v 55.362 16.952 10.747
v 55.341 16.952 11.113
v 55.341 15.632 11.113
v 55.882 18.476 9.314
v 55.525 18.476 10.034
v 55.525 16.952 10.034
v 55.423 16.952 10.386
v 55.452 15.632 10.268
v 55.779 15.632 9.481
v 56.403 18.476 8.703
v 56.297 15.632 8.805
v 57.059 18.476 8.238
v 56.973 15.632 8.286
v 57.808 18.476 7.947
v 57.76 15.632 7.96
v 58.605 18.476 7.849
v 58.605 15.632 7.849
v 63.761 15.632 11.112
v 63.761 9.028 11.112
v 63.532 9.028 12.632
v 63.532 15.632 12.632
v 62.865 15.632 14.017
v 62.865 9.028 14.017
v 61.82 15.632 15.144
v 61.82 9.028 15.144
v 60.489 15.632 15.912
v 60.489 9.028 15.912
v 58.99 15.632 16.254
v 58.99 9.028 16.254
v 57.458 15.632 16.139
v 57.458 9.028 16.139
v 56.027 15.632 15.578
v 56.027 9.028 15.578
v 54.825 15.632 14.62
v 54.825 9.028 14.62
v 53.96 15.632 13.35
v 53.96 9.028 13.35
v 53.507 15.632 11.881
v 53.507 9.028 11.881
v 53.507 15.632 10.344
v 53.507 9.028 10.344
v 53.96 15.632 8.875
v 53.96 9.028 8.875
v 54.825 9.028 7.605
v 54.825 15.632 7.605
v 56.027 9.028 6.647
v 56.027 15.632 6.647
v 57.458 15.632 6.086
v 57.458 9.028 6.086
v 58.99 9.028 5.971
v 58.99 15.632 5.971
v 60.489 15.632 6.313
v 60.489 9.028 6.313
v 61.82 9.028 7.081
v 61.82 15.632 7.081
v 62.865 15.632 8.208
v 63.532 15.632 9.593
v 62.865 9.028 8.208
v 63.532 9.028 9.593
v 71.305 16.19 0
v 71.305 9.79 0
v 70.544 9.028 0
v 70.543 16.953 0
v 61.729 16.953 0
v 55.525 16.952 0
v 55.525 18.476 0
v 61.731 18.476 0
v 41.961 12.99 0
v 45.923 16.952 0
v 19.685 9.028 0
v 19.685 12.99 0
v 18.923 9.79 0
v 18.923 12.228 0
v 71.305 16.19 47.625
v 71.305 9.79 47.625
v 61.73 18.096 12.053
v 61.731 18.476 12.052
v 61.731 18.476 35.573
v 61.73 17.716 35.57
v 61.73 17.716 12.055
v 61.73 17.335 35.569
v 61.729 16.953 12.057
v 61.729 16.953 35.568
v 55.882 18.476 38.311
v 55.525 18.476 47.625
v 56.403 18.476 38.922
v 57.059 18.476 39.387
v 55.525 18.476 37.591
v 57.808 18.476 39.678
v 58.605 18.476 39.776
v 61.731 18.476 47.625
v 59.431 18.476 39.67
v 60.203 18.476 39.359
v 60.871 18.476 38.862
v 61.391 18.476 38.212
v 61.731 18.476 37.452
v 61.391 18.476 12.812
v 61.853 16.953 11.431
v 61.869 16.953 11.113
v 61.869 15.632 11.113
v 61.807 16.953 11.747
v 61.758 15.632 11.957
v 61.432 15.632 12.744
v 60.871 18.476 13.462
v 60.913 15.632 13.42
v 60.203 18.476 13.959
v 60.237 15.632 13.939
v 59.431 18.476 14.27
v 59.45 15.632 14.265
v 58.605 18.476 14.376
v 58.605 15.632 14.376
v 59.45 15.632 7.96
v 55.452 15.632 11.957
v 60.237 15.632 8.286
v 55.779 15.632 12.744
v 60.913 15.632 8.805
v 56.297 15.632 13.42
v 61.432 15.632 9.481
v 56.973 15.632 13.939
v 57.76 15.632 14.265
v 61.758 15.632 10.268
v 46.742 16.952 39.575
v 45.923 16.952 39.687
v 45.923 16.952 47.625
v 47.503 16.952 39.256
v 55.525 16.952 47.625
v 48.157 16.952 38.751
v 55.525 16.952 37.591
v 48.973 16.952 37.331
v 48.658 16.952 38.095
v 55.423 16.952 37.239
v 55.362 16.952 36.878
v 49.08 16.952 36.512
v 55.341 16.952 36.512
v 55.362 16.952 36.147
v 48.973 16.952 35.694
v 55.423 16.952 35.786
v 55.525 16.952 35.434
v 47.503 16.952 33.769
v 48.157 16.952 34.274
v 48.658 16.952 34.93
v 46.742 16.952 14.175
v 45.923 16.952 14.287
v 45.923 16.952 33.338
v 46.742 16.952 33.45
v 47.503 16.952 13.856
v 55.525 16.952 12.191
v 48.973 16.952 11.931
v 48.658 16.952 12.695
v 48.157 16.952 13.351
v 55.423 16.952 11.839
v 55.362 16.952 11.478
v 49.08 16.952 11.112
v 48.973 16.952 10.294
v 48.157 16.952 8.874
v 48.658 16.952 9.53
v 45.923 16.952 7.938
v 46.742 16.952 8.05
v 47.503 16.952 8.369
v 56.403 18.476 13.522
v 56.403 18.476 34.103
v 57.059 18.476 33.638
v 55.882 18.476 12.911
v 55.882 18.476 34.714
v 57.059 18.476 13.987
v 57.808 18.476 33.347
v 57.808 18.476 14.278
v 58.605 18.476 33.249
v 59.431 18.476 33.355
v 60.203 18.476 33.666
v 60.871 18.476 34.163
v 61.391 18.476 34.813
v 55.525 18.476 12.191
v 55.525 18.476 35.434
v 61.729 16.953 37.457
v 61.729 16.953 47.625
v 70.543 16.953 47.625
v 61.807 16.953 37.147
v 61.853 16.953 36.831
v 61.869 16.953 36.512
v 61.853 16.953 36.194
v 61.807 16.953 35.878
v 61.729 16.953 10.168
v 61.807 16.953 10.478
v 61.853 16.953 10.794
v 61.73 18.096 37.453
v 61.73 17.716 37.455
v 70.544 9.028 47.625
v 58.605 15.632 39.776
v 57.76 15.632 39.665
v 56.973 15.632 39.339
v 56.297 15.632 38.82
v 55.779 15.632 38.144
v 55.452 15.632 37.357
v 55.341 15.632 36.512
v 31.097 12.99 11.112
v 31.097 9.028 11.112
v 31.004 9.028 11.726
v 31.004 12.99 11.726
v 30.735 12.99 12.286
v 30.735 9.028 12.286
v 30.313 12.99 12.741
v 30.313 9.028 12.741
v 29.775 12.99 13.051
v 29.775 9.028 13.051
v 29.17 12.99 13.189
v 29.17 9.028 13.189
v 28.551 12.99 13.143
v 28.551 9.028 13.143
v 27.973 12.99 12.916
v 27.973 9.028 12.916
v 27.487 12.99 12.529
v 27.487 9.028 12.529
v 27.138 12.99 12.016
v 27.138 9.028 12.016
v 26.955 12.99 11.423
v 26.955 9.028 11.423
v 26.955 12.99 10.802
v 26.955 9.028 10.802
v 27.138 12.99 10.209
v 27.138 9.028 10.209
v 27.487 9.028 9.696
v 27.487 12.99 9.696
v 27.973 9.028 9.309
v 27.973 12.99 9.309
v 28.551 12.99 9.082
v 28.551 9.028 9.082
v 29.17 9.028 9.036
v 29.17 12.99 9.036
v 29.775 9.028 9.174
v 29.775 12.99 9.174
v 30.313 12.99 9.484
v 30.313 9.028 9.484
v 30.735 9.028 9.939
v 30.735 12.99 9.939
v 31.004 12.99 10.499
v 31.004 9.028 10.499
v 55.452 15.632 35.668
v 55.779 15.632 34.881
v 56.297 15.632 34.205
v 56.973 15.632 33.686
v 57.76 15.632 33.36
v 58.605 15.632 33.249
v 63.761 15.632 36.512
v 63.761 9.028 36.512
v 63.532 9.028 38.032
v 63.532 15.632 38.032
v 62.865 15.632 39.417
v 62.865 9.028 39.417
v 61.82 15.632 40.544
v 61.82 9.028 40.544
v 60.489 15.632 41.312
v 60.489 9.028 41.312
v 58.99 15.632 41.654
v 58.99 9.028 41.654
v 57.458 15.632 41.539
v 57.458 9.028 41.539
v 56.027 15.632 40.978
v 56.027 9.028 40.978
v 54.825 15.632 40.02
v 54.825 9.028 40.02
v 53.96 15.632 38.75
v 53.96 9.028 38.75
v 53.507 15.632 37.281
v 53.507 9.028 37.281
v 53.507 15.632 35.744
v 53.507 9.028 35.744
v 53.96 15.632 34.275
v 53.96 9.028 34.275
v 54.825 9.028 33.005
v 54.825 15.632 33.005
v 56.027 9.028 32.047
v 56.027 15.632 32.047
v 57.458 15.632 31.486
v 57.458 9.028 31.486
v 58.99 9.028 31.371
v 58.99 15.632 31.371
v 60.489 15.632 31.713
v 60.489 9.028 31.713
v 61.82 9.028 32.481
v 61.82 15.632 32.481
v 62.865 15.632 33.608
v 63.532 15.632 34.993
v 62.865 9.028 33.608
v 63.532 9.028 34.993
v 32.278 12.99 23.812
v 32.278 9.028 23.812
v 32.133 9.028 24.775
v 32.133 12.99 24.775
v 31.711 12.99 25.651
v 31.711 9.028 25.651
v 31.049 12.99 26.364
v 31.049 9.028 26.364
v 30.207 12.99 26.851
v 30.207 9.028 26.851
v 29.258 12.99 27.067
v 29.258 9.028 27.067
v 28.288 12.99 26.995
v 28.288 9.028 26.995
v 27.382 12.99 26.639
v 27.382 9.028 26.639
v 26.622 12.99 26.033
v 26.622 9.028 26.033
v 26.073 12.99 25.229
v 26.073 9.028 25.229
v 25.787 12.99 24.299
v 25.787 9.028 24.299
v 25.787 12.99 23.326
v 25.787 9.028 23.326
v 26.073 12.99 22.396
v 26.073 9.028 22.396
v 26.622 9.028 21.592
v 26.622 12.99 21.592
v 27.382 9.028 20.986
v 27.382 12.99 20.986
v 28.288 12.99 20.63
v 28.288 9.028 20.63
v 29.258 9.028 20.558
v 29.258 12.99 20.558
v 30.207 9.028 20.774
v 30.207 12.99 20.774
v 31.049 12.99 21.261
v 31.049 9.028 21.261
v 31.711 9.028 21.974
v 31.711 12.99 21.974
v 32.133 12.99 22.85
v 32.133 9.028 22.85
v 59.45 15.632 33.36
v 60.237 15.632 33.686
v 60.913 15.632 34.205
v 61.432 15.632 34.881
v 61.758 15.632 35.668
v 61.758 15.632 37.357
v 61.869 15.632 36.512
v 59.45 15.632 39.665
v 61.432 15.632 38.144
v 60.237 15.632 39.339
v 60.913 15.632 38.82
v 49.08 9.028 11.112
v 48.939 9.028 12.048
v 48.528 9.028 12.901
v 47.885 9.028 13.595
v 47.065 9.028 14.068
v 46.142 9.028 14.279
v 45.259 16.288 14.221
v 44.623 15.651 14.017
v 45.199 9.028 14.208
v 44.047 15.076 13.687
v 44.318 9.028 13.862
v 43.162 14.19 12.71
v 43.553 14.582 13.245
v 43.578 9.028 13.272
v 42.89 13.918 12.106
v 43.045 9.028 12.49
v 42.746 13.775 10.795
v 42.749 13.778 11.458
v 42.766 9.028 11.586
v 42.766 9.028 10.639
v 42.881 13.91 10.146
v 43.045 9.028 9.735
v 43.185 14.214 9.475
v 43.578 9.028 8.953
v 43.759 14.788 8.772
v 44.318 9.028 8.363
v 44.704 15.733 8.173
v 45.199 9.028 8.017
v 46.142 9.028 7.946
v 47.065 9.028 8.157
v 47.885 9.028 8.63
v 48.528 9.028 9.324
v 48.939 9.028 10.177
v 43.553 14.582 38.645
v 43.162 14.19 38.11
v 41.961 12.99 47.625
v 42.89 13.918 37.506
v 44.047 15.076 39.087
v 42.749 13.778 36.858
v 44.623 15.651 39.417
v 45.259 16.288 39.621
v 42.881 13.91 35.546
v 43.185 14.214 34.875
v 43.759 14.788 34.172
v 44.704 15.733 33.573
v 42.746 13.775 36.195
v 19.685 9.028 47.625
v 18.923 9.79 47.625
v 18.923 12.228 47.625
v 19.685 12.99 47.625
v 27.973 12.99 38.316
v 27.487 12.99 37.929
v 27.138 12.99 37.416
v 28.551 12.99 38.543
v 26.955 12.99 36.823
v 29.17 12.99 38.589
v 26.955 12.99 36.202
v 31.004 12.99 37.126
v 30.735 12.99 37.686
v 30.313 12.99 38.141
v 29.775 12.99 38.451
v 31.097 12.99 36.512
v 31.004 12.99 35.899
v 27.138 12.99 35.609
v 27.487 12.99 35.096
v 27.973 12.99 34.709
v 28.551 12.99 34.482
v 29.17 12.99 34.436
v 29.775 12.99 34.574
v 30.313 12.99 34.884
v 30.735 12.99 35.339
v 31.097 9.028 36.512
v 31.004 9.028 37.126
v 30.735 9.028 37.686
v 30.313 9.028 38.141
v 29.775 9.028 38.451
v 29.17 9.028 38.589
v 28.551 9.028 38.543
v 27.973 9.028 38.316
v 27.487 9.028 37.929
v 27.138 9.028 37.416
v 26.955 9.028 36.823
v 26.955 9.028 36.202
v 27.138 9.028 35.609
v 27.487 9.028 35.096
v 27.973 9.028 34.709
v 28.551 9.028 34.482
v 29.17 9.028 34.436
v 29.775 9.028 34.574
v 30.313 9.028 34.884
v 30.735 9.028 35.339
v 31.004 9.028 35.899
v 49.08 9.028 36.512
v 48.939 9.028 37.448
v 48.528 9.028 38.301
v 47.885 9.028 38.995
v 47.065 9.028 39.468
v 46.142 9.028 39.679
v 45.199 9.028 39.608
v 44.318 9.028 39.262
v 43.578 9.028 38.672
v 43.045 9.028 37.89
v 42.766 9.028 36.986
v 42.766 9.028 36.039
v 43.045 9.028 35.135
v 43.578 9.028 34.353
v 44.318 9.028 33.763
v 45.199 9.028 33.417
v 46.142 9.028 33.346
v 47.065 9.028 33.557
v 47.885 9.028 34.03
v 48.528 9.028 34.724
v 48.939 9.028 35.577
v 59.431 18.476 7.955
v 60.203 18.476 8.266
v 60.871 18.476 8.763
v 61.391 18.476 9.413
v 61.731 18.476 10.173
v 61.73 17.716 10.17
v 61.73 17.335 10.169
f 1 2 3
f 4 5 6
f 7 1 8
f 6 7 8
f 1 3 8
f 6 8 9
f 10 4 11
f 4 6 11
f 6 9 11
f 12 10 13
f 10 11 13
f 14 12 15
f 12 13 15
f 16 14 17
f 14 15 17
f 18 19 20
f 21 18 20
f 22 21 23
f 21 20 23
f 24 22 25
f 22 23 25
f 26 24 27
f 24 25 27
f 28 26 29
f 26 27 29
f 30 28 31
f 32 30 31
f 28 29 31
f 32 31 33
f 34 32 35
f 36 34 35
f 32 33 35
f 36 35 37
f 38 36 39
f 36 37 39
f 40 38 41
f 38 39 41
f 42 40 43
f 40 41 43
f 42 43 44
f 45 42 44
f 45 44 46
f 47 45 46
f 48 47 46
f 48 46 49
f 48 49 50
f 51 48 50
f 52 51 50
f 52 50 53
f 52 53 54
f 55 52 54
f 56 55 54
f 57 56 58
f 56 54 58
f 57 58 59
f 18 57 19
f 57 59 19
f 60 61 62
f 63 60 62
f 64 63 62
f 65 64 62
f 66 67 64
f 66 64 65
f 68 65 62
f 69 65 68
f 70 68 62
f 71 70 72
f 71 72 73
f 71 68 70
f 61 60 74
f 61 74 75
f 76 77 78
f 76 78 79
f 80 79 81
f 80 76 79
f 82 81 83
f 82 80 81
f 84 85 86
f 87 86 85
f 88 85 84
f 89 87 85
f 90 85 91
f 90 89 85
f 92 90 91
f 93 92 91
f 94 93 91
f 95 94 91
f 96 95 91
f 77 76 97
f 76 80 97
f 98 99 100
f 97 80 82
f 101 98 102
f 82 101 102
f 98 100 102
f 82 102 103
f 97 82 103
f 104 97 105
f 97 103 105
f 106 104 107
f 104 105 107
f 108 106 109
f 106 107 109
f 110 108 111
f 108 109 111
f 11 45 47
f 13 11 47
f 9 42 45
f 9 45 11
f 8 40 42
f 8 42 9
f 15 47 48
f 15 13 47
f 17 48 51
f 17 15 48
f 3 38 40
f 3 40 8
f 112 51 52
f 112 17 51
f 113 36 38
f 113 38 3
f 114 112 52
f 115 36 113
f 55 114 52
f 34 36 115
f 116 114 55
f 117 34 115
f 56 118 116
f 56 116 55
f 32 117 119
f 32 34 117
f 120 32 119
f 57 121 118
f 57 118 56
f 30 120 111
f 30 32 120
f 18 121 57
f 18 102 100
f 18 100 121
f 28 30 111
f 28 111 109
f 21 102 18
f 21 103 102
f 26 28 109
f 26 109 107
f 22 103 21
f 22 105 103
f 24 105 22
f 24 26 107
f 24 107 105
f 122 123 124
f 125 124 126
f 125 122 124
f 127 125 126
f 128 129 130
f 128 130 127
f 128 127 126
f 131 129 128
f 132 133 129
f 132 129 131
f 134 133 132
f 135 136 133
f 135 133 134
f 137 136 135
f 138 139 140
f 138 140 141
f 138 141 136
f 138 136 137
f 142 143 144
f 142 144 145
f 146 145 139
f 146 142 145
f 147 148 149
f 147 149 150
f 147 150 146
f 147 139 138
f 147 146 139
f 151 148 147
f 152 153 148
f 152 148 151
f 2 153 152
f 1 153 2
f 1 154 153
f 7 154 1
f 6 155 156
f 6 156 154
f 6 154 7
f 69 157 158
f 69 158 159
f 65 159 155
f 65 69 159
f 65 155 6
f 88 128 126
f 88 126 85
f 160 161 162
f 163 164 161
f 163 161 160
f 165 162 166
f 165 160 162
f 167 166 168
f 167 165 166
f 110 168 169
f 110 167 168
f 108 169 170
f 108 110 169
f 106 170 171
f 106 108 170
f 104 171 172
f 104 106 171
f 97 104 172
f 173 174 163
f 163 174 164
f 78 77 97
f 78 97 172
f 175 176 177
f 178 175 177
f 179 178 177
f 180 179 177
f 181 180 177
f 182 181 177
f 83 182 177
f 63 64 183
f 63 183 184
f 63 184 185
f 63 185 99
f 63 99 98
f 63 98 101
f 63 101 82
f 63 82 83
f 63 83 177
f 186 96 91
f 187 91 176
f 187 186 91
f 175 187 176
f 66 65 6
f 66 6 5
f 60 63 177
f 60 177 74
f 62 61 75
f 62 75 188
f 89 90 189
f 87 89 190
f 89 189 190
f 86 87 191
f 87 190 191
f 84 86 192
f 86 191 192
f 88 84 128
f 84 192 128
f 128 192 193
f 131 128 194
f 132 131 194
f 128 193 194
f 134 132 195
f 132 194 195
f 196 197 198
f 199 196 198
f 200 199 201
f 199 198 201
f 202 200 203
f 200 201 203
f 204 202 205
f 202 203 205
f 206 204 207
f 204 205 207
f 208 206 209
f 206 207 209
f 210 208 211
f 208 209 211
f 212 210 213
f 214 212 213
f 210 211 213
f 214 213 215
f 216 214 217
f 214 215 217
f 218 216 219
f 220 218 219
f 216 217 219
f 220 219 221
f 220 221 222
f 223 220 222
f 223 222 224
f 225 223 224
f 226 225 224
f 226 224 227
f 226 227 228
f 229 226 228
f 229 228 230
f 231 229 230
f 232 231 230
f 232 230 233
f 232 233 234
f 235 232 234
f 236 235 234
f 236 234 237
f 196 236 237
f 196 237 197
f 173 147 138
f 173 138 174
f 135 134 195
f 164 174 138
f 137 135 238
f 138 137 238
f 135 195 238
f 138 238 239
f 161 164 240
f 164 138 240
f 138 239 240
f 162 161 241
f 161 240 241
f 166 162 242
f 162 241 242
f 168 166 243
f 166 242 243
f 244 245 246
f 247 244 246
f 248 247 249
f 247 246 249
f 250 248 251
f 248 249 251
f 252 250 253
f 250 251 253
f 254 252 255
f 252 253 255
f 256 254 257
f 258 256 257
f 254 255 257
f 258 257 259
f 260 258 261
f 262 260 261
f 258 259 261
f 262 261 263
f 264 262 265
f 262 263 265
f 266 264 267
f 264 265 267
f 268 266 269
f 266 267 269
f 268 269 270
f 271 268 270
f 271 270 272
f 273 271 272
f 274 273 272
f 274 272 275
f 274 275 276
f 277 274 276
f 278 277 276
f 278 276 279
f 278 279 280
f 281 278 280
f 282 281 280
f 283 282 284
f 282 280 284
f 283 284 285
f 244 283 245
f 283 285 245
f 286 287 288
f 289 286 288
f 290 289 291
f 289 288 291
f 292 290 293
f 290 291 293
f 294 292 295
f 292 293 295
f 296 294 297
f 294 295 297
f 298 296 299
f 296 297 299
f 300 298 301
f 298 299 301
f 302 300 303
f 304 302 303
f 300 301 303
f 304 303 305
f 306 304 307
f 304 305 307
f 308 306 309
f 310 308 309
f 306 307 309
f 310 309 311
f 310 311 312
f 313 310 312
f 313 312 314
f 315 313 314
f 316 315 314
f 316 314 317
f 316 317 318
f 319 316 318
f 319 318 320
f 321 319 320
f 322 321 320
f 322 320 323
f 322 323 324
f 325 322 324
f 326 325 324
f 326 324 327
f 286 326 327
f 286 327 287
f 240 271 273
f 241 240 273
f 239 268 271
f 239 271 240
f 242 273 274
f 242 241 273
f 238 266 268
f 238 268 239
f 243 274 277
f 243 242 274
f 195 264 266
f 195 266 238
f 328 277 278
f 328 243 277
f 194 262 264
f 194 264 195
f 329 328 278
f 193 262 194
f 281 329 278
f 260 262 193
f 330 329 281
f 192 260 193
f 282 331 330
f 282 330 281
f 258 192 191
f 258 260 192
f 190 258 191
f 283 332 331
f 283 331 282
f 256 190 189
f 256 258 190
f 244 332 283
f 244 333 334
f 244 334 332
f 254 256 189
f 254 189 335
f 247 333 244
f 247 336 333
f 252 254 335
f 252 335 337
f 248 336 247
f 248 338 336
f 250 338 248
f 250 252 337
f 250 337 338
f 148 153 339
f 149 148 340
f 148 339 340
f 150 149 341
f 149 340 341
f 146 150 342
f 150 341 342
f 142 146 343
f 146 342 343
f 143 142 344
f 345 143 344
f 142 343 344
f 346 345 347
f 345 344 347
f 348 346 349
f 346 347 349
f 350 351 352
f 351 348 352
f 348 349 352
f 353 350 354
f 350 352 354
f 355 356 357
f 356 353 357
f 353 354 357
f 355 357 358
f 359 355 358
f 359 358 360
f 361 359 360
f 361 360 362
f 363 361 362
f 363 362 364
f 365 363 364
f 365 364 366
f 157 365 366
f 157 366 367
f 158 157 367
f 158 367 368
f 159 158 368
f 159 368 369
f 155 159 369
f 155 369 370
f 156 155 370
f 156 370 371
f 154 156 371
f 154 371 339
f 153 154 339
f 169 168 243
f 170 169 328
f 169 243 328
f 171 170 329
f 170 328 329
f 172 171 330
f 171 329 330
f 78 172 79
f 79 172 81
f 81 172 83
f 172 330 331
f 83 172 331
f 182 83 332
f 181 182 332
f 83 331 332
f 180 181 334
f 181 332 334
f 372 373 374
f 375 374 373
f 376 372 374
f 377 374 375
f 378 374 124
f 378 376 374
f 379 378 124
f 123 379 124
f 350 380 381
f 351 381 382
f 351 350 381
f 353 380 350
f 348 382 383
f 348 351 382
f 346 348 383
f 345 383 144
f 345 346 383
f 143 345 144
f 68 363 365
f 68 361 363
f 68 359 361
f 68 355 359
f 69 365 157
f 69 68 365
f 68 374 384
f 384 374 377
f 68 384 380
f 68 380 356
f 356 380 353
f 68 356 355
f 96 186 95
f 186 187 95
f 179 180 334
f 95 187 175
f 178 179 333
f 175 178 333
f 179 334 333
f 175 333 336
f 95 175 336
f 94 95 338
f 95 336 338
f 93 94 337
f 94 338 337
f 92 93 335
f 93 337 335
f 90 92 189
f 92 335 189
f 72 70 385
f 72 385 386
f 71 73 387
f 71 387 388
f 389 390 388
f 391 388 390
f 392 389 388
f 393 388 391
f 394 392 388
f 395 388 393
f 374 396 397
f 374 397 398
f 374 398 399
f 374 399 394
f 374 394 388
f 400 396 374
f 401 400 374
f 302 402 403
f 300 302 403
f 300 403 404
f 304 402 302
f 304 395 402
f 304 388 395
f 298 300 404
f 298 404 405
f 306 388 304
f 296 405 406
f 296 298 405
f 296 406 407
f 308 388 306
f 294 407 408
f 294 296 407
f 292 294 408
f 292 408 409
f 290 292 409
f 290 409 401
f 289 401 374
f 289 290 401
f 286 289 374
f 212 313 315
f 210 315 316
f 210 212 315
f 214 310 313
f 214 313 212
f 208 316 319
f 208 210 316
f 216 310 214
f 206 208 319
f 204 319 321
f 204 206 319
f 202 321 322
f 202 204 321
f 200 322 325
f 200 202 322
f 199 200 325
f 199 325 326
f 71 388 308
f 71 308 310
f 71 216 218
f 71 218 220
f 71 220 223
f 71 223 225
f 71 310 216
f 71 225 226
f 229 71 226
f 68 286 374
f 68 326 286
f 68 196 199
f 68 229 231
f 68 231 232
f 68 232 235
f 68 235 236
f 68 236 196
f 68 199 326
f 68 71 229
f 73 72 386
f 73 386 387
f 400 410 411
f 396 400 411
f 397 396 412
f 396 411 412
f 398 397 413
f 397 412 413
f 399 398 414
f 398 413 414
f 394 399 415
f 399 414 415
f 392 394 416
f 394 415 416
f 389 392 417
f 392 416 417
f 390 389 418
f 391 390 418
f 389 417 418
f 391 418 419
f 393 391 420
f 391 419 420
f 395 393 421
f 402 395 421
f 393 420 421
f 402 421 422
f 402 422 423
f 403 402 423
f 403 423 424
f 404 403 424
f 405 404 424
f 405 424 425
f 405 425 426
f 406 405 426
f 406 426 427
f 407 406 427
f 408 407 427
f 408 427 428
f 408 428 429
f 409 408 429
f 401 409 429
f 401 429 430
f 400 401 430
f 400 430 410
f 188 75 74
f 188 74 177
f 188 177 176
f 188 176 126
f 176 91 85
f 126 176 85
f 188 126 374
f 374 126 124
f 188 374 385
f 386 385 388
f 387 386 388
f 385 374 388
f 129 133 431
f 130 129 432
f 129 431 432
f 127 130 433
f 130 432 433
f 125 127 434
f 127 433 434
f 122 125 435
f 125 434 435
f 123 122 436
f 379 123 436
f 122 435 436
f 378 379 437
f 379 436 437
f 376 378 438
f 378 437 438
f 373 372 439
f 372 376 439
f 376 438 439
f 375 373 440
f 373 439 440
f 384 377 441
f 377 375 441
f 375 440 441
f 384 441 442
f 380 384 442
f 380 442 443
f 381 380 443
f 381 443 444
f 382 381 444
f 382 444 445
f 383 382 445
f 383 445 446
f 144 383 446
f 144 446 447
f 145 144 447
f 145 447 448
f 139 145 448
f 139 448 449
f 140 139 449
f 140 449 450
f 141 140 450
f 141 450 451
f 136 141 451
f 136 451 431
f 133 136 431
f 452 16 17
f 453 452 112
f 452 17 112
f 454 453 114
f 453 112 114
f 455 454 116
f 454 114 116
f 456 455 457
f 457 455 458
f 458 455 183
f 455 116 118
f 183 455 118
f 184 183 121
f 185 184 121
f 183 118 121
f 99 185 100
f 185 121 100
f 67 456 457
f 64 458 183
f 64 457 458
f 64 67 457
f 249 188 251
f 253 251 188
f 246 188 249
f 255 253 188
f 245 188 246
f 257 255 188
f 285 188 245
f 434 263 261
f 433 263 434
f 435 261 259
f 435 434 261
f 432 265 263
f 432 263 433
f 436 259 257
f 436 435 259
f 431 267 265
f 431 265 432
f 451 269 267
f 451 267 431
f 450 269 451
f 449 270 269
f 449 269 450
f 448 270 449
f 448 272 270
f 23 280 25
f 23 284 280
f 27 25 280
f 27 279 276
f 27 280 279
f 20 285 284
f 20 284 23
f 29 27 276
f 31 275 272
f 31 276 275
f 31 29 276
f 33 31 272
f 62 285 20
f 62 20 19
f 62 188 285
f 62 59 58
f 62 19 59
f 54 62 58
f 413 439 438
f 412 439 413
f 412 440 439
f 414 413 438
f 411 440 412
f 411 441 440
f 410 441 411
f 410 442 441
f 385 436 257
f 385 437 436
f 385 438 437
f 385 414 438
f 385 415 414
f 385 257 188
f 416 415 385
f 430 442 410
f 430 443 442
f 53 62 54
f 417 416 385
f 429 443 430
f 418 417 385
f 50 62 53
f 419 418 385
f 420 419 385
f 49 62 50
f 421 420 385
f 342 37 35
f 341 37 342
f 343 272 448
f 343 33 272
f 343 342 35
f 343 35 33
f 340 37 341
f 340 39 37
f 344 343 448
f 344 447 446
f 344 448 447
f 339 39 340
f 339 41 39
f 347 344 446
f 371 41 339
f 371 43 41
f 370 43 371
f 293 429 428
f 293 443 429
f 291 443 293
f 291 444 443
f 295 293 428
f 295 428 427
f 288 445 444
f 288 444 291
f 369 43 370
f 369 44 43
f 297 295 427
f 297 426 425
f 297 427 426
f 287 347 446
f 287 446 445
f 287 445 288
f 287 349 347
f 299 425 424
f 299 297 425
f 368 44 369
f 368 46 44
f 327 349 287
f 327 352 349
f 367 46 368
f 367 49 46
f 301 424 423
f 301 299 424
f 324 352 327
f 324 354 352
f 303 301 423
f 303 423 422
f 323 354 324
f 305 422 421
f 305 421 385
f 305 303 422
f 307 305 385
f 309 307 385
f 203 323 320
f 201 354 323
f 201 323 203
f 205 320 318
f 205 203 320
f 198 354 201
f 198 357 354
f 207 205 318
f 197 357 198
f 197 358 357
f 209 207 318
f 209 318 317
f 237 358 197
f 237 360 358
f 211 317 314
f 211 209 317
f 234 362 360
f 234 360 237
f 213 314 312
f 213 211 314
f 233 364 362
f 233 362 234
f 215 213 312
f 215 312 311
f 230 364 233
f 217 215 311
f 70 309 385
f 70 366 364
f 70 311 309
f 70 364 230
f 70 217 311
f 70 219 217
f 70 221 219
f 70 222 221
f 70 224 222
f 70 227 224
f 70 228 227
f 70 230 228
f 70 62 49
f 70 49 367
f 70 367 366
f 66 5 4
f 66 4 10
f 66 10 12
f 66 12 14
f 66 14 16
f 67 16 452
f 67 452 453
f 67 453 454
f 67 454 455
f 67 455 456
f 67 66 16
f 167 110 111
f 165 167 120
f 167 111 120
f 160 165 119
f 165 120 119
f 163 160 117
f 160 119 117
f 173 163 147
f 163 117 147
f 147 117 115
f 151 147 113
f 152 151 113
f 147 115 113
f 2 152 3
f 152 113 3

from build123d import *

# Parameters (mm, degrees)
EXTRUDE1_DEPTH     = 47.625
CUT_EXTRUDE1_DEPTH = 47.625
SKETCH3_R          = 5.1562
CUT_EXTRUDE2_DEPTH = 6.604
SKETCH4_R          = 3.175
CUT_EXTRUDE3_DEPTH = 10.4488
SKETCH5_R          = 2.0828
SKETCH5_R_2        = 3.2639
CUT_EXTRUDE4_DEPTH = 10.4488


with BuildPart() as part:
    # Sketch1 → Extrude1 (new body)
    with BuildSketch(Plane.XY):
        Polygon((55.524691805, 16.952365829), (55.524691805, 18.476365829), (61.730833978, 18.476365829), (61.729335279, 16.953119016), (70.543139545, 16.953119016), (71.305139176, 16.190369296), (71.305139176, 9.78956546), (70.543888896, 9.027565829), (19.685291805, 9.027565829), (18.923291805, 9.789565829), (18.923291805, 12.227965829), (19.685291805, 12.989965829), (41.961091805, 12.989965829), (45.923491805, 16.952365829), align=None)
    extrude(amount=EXTRUDE1_DEPTH)

    # Sketch2 → Cut-Extrude1 (cut)
    with BuildSketch(Plane.XZ.offset(-9.027565829)):
        with BuildLine():
            ThreePointArc((61.869039176, 36.5125), (60.913064999, 38.820425823), (58.605139176, 39.7764))
            Line((58.605139176, 39.7764), (58.605139176, 36.5125))
            Line((58.605139176, 36.5125), (61.869039176, 36.5125))
        make_face()
        with BuildLine():
            Line((58.605139176, 36.5125), (58.605139176, 39.7764))
            ThreePointArc((58.605139176, 39.7764), (56.297213353, 38.820425823), (55.341239176, 36.5125))
            Line((55.341239176, 36.5125), (58.605139176, 36.5125))
        make_face()
        with BuildLine():
            Line((61.869039176, 36.5125), (58.605139176, 36.5125))
            Line((58.605139176, 36.5125), (58.605139176, 33.2486))
            ThreePointArc((58.605139176, 33.2486), (60.913064999, 34.204574177), (61.869039176, 36.5125))
        make_face()
        with BuildLine():
            Line((58.605139176, 33.2486), (58.605139176, 36.5125))
            Line((58.605139176, 36.5125), (55.341239176, 36.5125))
            ThreePointArc((55.341239176, 36.5125), (56.297213353, 34.204574177), (58.605139176, 33.2486))
        make_face()
        with BuildLine():
            ThreePointArc((61.869039176, 11.1125), (60.913064999, 13.420425823), (58.605139176, 14.3764))
            Line((58.605139176, 14.3764), (58.605139176, 11.1125))
            Line((58.605139176, 11.1125), (61.869039176, 11.1125))
        make_face()
        with BuildLine():
            Line((58.605139176, 11.1125), (58.605139176, 14.3764))
            ThreePointArc((58.605139176, 14.3764), (56.297213353, 13.420425823), (55.341239176, 11.1125))
            Line((55.341239176, 11.1125), (58.605139176, 11.1125))
        make_face()
        with BuildLine():
            Line((61.869039176, 11.1125), (58.605139176, 11.1125))
            Line((58.605139176, 11.1125), (58.605139176, 7.8486))
            ThreePointArc((58.605139176, 7.8486), (60.913064999, 8.804574177), (61.869039176, 11.1125))
        make_face()
        with BuildLine():
            Line((58.605139176, 7.8486), (58.605139176, 11.1125))
            Line((58.605139176, 11.1125), (55.341239176, 11.1125))
            ThreePointArc((55.341239176, 11.1125), (56.297213353, 8.804574177), (58.605139176, 7.8486))
        make_face()
    extrude(amount=-CUT_EXTRUDE1_DEPTH, mode=Mode.SUBTRACT)

    # Sketch3 → Cut-Extrude2 (cut)
    with BuildSketch(Plane.XZ.offset(-9.027565829)):
        with Locations((58.605139176, 36.5125)):
            Circle(SKETCH3_R)
        with Locations((58.605139176, 11.1125)):
            Circle(SKETCH3_R)
    extrude(amount=-CUT_EXTRUDE2_DEPTH, mode=Mode.SUBTRACT)

    # Sketch4 → Cut-Extrude3 (cut, through all)
    with BuildSketch(Plane.XZ.offset(-9.027565829)):
        with Locations((45.905139176, 36.5125)):
            Circle(SKETCH4_R)
        with Locations((45.905139176, 11.1125)):
            Circle(SKETCH4_R)
    extrude(amount=-CUT_EXTRUDE3_DEPTH, mode=Mode.SUBTRACT)

    # Sketch5 → Cut-Extrude4 (cut, through all)
    with BuildSketch(Plane.XZ.offset(-9.027565829)):
        with Locations((29.014139176, 36.5125)):
            Circle(SKETCH5_R)
        with Locations((29.014139176, 11.1125)):
            Circle(SKETCH5_R)
        with Locations((29.014139176, 23.8125)):
            Circle(SKETCH5_R_2)
    extrude(amount=-CUT_EXTRUDE4_DEPTH, mode=Mode.SUBTRACT)


solid = part.part
